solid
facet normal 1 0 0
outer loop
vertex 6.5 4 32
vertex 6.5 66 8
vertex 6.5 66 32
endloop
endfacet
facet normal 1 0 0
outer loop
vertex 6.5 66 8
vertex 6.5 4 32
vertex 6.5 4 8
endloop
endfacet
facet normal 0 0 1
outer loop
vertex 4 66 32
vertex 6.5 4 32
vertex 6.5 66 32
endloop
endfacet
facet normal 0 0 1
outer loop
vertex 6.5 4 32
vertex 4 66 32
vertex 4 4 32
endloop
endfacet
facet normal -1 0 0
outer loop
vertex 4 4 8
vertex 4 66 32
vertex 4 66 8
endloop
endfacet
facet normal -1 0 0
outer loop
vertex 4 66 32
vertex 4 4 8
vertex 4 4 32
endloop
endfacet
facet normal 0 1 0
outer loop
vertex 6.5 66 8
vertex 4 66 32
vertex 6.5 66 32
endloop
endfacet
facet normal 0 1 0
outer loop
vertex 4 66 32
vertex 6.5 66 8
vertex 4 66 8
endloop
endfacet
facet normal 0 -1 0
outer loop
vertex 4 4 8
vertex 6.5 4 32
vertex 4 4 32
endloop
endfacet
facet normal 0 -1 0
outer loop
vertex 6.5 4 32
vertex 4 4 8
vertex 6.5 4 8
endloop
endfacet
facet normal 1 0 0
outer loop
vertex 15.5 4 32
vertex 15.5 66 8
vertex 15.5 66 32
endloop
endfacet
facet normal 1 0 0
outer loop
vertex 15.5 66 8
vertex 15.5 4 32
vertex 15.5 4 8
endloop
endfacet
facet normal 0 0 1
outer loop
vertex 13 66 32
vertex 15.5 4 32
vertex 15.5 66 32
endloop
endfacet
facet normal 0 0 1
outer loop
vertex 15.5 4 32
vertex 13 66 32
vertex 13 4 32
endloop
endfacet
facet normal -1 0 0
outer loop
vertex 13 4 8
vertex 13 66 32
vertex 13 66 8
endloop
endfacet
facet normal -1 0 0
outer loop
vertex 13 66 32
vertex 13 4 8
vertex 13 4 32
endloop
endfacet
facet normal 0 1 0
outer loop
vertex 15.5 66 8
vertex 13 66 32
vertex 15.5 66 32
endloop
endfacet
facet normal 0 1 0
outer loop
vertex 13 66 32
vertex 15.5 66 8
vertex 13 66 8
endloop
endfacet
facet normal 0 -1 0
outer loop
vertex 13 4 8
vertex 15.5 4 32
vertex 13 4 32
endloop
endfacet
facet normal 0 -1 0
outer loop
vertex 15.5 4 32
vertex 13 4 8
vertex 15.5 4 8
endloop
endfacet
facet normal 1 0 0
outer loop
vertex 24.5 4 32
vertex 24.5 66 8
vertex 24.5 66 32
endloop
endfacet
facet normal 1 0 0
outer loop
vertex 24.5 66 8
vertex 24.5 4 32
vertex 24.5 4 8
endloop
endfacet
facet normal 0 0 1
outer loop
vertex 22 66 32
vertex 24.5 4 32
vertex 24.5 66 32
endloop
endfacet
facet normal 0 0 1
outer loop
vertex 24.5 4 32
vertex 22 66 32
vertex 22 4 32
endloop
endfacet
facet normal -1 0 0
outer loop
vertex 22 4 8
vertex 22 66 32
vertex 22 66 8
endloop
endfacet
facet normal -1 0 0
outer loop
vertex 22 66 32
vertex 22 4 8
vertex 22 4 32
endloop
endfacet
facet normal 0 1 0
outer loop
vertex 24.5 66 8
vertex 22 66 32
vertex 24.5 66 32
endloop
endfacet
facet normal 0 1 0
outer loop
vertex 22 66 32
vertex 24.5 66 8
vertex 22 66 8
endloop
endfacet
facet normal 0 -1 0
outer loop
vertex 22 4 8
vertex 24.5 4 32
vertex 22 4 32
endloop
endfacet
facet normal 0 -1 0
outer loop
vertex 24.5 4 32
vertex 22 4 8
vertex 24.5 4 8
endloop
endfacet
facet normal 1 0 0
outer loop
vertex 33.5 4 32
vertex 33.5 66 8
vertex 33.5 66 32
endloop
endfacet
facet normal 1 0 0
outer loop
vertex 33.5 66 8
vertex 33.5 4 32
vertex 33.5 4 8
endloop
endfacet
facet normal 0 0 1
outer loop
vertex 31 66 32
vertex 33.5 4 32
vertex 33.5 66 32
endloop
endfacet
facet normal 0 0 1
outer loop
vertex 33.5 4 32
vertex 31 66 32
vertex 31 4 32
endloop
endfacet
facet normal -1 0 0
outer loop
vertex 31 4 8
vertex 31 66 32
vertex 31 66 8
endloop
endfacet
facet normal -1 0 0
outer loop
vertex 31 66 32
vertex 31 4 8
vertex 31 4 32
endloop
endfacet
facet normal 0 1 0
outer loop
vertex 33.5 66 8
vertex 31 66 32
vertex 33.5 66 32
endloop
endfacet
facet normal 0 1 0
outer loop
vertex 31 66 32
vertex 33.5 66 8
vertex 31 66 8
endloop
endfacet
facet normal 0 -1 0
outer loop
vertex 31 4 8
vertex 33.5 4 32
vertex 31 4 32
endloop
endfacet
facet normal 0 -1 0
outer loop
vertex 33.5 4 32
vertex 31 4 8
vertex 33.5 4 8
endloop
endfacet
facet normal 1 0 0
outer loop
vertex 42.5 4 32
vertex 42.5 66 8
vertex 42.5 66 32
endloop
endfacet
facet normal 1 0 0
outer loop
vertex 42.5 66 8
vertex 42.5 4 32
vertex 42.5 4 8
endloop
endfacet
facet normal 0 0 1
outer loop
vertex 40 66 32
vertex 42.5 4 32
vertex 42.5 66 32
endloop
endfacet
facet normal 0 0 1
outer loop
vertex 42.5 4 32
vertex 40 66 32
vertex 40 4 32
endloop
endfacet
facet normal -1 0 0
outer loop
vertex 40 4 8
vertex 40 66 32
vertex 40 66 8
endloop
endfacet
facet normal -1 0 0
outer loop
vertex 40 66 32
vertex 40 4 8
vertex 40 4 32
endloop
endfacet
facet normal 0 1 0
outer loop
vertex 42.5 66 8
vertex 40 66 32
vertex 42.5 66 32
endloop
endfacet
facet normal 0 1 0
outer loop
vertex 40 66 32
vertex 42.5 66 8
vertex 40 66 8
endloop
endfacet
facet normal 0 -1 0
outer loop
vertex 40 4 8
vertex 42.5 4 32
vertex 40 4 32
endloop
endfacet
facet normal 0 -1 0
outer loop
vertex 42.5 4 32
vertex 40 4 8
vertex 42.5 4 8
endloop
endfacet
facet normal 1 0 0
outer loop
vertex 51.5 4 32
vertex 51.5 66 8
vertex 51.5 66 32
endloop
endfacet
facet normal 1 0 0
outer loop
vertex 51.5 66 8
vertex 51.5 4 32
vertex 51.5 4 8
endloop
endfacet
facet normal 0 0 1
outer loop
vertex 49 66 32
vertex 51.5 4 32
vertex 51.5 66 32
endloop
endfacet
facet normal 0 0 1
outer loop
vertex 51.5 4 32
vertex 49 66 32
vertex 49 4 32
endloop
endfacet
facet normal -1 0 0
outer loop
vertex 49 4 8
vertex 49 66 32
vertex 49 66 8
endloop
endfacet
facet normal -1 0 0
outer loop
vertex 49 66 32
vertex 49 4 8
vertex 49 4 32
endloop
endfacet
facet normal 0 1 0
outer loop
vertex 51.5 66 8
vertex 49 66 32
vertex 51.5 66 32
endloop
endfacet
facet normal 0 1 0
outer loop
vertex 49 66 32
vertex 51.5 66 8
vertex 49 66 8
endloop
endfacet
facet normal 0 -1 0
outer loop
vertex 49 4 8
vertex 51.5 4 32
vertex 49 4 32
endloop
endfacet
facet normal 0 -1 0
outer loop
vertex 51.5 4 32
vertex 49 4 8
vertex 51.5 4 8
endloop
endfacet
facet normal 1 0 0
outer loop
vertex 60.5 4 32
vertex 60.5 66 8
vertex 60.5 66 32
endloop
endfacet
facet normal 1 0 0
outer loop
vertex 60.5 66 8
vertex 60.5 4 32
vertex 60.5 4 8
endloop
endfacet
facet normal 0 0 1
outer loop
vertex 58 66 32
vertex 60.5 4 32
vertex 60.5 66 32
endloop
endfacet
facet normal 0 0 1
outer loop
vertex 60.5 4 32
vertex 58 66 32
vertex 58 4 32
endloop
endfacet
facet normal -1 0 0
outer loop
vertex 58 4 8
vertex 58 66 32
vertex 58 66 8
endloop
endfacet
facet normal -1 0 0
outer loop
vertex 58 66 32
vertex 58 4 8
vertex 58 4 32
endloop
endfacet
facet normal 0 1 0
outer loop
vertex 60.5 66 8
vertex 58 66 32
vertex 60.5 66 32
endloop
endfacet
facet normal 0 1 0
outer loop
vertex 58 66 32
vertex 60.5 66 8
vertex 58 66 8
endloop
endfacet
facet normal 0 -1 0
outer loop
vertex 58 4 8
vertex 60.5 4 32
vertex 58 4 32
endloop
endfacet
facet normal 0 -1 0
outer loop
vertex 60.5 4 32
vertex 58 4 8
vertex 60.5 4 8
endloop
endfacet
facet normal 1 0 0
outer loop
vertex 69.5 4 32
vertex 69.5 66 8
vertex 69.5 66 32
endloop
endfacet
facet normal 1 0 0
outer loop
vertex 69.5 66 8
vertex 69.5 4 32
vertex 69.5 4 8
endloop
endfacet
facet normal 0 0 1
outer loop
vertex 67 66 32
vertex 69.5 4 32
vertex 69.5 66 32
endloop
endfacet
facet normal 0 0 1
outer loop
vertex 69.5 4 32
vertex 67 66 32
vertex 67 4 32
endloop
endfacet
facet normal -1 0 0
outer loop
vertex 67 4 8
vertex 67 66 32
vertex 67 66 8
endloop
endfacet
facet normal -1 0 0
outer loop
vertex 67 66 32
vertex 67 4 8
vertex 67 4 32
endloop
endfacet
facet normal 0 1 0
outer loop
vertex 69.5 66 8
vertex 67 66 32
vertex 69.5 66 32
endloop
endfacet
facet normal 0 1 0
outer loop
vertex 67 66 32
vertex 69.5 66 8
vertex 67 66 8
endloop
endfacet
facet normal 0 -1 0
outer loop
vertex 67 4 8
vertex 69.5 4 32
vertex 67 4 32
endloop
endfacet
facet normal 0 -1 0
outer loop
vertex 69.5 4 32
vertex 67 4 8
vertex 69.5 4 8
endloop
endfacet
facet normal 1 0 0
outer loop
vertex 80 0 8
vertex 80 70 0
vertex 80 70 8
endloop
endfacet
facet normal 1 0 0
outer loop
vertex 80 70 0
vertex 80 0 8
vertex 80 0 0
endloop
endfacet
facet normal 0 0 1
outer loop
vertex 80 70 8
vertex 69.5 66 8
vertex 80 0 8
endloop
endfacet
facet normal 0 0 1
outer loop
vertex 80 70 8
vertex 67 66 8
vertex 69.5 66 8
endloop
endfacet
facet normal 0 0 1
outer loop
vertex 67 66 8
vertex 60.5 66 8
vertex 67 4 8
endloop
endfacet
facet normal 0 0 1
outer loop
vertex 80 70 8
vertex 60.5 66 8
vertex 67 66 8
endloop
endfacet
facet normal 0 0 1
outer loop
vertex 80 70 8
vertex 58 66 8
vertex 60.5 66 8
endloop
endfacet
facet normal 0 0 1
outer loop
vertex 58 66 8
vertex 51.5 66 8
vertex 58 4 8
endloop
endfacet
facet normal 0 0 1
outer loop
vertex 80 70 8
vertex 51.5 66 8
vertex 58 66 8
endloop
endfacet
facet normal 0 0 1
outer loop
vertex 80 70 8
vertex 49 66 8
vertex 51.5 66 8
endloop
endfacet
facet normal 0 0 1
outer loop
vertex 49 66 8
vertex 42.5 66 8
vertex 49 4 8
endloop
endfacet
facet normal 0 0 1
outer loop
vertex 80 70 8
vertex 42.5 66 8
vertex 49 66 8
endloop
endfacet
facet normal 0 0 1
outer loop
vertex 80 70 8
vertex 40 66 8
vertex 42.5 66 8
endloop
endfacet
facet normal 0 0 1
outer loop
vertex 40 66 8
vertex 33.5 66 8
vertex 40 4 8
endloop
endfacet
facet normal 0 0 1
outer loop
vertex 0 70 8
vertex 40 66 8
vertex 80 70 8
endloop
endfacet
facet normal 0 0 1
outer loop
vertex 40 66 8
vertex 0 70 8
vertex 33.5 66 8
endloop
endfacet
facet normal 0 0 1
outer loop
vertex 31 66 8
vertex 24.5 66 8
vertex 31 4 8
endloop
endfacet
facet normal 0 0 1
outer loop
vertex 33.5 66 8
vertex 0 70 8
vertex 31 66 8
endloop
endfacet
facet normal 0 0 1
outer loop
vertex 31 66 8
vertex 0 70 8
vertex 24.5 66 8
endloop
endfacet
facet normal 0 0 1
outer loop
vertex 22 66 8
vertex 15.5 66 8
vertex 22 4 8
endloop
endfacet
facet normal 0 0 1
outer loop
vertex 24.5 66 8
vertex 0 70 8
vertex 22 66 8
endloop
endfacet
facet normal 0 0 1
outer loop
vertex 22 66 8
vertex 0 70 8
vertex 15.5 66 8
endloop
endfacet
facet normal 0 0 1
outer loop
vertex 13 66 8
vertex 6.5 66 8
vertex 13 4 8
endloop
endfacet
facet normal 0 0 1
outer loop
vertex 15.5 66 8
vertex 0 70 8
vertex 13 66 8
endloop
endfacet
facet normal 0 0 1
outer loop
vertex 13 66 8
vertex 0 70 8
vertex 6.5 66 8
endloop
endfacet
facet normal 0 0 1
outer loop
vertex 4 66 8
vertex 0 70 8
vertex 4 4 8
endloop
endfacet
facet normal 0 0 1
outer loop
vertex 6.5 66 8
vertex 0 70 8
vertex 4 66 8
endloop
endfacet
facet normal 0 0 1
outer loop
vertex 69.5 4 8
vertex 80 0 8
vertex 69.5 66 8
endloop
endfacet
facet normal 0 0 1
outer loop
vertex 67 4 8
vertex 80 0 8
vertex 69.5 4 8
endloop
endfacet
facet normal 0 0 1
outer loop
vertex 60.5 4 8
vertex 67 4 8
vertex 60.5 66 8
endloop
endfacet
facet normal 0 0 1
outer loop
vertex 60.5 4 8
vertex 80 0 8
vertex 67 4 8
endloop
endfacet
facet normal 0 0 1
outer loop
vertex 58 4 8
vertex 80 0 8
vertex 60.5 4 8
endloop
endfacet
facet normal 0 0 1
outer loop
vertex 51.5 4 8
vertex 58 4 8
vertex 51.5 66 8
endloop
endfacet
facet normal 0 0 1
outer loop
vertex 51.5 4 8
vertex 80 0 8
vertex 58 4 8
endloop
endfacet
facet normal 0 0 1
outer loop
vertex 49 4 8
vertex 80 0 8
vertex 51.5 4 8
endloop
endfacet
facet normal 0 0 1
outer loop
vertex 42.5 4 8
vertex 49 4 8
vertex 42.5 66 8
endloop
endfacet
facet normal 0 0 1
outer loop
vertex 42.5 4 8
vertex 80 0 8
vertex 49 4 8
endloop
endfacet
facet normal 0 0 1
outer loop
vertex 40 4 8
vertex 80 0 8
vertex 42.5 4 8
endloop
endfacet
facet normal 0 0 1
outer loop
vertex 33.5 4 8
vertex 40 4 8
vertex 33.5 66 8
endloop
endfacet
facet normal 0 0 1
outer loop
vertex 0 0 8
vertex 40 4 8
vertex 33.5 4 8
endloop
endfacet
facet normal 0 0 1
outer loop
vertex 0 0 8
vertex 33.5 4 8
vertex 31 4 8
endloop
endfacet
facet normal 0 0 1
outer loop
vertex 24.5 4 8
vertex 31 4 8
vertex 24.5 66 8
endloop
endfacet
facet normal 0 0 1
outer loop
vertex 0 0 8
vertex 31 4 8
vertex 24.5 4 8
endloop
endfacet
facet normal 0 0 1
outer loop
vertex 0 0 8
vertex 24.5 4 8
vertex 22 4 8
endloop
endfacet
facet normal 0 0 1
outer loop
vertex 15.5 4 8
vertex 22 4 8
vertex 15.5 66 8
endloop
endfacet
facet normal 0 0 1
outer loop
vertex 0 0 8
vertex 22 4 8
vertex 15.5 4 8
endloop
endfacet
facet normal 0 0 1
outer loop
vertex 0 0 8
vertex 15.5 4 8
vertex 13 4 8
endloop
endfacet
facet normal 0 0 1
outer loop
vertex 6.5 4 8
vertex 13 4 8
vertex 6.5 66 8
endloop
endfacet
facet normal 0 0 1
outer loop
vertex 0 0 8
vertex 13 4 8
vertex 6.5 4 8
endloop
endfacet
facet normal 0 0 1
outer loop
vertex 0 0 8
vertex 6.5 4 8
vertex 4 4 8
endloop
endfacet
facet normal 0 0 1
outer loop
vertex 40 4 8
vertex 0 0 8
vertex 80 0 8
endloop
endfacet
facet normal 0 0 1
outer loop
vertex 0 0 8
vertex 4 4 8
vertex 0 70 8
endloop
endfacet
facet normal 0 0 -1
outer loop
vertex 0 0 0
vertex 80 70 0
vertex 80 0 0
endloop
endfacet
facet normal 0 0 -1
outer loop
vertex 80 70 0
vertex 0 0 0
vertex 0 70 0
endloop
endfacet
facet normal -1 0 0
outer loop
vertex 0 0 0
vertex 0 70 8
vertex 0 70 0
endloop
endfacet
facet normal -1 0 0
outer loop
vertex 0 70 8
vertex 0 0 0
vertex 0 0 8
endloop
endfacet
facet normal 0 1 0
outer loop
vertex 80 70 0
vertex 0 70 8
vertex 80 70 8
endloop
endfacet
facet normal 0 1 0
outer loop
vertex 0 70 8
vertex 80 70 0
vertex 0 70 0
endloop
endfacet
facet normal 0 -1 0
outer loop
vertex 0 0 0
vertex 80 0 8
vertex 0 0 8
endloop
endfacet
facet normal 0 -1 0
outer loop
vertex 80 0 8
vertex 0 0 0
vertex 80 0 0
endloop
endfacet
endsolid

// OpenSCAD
$fn = 32;

// ----------------------------------------------------------------------
// Heatsink: uniform fin block
// ----------------------------------------------------------------------

// --- parameters (mm) ---
base_l = 80;              // base length, X
base_w = 70;              // base width, Y
base_t = 8;               // base plate thickness
fin_h = 25;               // fin height above the base
fin_t = 2.5;              // fin thickness
edge = 4;                 // margin from the base ends
pitch = 9;                // fin pitch

n_fins = floor((base_l - 2 * edge - fin_t) / pitch) + 1;  // fin count
total_h = base_t + fin_h - 1;  // overall height

union() {
  cube([base_l, base_w, base_t]);
  for (i = [0 : n_fins - 1])
    translate([edge + i * pitch, edge, base_t - 1])
      cube([fin_t, base_w - 2 * edge, fin_h]);
}
